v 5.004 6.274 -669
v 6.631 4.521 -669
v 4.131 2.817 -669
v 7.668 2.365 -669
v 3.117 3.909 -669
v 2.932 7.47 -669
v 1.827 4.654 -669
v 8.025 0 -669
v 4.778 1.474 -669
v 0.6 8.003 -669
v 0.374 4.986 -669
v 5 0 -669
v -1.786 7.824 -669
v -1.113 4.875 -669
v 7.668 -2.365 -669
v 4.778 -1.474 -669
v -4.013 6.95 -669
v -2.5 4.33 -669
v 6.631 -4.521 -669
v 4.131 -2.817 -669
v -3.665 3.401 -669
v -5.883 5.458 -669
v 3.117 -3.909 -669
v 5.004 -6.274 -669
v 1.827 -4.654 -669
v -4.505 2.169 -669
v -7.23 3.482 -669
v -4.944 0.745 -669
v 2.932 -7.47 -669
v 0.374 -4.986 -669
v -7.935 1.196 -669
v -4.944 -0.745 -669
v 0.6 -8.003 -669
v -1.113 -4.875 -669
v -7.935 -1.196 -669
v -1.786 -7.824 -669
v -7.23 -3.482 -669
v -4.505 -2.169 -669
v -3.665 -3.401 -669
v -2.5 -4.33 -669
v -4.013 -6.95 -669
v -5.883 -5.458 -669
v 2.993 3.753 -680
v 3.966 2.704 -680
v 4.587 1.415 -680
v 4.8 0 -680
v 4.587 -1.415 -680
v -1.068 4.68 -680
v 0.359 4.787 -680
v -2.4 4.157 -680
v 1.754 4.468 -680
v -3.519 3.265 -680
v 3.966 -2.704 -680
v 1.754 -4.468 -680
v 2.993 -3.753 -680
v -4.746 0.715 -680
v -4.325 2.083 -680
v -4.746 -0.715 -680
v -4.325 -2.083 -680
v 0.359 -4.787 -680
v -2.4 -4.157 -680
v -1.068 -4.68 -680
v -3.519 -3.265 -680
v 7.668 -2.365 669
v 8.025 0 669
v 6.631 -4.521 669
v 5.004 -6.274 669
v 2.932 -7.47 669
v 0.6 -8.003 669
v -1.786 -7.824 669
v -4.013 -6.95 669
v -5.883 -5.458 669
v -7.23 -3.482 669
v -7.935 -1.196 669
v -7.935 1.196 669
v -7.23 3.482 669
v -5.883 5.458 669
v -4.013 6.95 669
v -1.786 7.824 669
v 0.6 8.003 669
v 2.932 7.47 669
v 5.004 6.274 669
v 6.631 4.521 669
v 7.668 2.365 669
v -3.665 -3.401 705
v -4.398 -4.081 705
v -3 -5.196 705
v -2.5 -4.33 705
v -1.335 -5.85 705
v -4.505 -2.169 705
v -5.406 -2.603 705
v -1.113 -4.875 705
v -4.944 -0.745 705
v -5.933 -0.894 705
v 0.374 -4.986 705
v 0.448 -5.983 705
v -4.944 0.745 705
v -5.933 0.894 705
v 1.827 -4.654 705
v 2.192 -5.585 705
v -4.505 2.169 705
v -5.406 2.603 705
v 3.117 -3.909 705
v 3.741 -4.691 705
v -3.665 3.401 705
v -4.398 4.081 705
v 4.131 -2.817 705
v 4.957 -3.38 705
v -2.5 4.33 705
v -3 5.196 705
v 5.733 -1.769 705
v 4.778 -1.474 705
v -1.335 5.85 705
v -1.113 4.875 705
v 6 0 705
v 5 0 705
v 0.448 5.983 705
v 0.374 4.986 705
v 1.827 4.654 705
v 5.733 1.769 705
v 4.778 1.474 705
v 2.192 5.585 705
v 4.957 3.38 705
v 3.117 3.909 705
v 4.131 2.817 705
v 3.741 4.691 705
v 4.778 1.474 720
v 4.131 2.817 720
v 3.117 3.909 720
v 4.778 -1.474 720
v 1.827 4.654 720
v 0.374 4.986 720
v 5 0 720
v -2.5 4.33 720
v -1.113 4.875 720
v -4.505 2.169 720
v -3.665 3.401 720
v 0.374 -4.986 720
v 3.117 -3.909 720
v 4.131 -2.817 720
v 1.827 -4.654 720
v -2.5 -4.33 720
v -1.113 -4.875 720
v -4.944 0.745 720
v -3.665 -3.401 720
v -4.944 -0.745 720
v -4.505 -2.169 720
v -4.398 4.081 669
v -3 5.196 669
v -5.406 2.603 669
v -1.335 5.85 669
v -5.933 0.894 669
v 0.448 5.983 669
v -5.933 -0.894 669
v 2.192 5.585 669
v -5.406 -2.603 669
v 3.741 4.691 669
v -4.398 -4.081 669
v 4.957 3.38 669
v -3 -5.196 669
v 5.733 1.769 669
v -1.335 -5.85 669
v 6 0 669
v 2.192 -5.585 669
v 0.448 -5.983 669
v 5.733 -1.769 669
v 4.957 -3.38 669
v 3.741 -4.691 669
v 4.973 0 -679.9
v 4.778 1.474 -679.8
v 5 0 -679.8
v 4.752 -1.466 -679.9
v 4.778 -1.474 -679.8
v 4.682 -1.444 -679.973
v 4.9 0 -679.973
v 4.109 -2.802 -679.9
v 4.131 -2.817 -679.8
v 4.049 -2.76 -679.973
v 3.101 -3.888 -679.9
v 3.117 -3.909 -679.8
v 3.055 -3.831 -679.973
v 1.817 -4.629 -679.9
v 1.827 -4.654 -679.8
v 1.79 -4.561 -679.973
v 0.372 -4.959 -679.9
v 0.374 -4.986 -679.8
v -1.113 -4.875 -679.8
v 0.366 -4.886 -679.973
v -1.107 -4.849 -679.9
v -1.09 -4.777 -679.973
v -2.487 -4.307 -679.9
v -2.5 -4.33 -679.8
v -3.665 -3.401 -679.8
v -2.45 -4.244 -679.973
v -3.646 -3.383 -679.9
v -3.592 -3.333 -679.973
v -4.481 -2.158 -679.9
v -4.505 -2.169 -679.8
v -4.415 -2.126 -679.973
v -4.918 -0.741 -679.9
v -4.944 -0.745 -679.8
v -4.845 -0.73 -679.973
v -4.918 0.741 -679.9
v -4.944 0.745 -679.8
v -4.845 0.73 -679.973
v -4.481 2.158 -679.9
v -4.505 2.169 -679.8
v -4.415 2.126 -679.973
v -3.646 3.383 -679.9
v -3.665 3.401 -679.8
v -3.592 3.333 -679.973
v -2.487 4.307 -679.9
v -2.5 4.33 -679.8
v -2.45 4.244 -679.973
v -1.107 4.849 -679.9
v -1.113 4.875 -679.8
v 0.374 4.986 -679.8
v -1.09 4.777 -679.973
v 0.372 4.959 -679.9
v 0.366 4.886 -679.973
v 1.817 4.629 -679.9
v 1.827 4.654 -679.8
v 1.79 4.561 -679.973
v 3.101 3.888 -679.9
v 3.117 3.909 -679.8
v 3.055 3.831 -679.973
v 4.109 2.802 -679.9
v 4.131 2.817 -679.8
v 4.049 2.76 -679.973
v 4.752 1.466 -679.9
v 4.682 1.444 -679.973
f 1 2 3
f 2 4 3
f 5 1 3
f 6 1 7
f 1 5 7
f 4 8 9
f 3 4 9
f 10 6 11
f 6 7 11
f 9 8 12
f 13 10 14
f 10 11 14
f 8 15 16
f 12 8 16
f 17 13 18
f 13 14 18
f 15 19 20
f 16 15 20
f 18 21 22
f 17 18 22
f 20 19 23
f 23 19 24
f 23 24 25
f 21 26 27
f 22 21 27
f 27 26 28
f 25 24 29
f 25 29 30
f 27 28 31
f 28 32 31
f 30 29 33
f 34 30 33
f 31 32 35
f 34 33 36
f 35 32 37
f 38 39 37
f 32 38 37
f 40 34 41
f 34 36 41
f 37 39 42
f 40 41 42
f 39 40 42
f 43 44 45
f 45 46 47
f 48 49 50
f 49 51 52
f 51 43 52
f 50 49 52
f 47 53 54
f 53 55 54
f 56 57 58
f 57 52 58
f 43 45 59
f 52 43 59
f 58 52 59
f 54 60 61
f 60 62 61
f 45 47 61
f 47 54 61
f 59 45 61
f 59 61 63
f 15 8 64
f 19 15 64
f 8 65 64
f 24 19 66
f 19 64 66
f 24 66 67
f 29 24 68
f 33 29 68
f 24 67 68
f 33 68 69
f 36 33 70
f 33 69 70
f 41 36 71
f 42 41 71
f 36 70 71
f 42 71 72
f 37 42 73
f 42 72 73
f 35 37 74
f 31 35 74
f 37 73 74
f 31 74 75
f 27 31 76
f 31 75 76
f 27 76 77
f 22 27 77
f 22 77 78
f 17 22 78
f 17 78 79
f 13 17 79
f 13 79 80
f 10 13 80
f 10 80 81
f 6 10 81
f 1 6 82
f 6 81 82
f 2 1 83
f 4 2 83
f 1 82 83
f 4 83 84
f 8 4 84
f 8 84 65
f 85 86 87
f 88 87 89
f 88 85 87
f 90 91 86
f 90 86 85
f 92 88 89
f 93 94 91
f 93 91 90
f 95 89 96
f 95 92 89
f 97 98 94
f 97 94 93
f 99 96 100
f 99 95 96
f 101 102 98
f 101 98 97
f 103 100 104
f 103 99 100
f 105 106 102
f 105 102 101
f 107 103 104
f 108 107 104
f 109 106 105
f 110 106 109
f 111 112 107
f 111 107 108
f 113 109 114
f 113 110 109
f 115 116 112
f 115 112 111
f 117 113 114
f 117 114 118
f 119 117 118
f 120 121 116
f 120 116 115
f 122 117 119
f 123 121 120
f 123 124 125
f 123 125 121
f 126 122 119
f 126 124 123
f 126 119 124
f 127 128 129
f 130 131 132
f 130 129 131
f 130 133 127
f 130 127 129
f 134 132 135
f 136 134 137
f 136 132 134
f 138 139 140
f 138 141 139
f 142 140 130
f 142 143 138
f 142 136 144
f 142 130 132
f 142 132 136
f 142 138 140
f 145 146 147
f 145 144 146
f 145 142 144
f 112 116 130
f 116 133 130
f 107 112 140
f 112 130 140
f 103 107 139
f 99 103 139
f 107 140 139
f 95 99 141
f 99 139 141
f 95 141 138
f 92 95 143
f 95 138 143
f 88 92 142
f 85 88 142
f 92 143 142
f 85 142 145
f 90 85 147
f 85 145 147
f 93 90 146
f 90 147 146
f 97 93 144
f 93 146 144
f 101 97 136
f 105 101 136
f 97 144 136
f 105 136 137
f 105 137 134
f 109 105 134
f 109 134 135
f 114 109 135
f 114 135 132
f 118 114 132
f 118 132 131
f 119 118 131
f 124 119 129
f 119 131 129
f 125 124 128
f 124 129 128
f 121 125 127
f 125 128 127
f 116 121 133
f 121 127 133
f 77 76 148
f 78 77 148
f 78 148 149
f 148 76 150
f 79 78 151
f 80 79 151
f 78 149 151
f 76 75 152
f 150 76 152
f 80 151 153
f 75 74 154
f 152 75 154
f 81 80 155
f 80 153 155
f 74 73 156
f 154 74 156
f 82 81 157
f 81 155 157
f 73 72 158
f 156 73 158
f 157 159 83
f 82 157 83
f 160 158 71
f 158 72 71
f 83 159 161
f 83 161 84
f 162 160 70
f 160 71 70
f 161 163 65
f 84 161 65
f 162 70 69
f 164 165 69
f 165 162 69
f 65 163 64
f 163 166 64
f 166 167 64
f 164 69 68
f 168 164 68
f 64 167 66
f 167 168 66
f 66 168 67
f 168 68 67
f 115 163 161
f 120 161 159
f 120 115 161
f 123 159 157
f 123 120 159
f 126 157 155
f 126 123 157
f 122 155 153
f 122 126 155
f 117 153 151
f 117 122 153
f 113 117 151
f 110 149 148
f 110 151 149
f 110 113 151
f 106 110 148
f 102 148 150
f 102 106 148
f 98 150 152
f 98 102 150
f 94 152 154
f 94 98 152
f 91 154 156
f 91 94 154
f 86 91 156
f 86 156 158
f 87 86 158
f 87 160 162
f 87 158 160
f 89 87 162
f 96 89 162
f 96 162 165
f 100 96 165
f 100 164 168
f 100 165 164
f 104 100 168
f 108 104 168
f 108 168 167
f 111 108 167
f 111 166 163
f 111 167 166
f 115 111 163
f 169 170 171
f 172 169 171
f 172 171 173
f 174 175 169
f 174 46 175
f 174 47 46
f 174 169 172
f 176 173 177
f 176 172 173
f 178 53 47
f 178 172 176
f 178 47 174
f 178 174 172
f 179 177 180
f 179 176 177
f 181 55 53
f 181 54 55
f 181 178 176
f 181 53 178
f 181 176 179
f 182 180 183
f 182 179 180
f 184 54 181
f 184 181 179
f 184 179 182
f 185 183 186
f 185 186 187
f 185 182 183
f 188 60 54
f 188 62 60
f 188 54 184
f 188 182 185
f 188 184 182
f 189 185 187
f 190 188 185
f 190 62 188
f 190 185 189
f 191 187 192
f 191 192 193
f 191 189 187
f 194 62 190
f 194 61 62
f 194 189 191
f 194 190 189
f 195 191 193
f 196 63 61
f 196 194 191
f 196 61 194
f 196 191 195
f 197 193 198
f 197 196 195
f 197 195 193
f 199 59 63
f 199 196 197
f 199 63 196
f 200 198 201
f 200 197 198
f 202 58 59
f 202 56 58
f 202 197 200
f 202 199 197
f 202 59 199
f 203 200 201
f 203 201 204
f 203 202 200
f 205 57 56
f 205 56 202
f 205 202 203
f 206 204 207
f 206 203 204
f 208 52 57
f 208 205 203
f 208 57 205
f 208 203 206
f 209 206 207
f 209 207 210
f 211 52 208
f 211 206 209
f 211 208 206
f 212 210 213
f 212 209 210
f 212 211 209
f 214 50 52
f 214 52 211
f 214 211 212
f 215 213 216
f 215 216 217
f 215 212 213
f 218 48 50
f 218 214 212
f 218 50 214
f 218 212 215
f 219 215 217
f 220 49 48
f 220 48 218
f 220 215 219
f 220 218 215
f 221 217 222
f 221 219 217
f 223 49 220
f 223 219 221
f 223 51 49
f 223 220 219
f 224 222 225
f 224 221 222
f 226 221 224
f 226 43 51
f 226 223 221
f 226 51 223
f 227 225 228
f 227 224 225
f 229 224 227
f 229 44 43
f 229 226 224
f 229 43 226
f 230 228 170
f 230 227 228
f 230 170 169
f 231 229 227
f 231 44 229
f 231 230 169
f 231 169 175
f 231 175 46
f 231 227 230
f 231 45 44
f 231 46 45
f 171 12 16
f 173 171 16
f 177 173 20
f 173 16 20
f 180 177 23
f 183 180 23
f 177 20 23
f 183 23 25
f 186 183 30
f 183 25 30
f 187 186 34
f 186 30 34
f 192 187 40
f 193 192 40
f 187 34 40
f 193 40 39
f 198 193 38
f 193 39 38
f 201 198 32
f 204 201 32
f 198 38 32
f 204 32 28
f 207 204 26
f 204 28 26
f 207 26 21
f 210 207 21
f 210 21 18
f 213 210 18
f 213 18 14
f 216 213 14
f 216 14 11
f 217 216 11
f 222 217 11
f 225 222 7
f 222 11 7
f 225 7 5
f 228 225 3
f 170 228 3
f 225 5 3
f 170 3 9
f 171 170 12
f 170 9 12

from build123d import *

# Parameters (mm, degrees)
F0_W   = 5
F0_H   = 15
F0_W_2 = 6
F0_H_2 = 22
F0_H_3 = 11
F3_R   = 0.2


# Not quite as in the source:
# - the program builds the solid bodies; features that only make, move or delete a surface that nothing else refers to are left out


with BuildPart() as f1:
    # F0 (on Front) → F1 (revolve)
    with BuildSketch(Plane.XZ):
        with Locations((2.5, 712.5)):
            Rectangle(F0_W, F0_H)
    revolve(axis=Axis((0, 0, -310.3163262457), (0, 0, -1)))



with BuildPart() as f1b:
    # F0 (on Front) → F1, piece 2 (revolve)
    with BuildSketch(Plane.XZ):
        with Locations((3, 680)):
            Rectangle(F0_W_2, F0_H_2)
        Polygon((0, 669), (0, 59.3673475087), (0, -669), (5, -669), (8.025, -669), (8.025, 669), (6, 669), align=None)
        with Locations((2.5, -674.5)):
            Rectangle(F0_W, F0_H_3)
    revolve(axis=Axis((0, 0, -310.3163262457), (0, 0, -1)))


with BuildPart() as f1_1:
    add(f1.part)

    add(f1b.part)  # F2 merges F1b
    # F0 (on Front) → F2 (revolve)
    with BuildSketch(Plane.XZ):
        Polygon((0, 705), (0, 691), (6, 691), (6, 705), (5, 705), align=None)
    revolve(axis=Axis((0, 0, 389.6836737543), (0, 0, 1)))

    # F3
    f3_edges = [f1_1.edges().sort_by_distance(p)[0] for p in [
        (-5, 0, -680),
    ]]
    fillet(f3_edges, radius=F3_R)


solid = f1_1.part
